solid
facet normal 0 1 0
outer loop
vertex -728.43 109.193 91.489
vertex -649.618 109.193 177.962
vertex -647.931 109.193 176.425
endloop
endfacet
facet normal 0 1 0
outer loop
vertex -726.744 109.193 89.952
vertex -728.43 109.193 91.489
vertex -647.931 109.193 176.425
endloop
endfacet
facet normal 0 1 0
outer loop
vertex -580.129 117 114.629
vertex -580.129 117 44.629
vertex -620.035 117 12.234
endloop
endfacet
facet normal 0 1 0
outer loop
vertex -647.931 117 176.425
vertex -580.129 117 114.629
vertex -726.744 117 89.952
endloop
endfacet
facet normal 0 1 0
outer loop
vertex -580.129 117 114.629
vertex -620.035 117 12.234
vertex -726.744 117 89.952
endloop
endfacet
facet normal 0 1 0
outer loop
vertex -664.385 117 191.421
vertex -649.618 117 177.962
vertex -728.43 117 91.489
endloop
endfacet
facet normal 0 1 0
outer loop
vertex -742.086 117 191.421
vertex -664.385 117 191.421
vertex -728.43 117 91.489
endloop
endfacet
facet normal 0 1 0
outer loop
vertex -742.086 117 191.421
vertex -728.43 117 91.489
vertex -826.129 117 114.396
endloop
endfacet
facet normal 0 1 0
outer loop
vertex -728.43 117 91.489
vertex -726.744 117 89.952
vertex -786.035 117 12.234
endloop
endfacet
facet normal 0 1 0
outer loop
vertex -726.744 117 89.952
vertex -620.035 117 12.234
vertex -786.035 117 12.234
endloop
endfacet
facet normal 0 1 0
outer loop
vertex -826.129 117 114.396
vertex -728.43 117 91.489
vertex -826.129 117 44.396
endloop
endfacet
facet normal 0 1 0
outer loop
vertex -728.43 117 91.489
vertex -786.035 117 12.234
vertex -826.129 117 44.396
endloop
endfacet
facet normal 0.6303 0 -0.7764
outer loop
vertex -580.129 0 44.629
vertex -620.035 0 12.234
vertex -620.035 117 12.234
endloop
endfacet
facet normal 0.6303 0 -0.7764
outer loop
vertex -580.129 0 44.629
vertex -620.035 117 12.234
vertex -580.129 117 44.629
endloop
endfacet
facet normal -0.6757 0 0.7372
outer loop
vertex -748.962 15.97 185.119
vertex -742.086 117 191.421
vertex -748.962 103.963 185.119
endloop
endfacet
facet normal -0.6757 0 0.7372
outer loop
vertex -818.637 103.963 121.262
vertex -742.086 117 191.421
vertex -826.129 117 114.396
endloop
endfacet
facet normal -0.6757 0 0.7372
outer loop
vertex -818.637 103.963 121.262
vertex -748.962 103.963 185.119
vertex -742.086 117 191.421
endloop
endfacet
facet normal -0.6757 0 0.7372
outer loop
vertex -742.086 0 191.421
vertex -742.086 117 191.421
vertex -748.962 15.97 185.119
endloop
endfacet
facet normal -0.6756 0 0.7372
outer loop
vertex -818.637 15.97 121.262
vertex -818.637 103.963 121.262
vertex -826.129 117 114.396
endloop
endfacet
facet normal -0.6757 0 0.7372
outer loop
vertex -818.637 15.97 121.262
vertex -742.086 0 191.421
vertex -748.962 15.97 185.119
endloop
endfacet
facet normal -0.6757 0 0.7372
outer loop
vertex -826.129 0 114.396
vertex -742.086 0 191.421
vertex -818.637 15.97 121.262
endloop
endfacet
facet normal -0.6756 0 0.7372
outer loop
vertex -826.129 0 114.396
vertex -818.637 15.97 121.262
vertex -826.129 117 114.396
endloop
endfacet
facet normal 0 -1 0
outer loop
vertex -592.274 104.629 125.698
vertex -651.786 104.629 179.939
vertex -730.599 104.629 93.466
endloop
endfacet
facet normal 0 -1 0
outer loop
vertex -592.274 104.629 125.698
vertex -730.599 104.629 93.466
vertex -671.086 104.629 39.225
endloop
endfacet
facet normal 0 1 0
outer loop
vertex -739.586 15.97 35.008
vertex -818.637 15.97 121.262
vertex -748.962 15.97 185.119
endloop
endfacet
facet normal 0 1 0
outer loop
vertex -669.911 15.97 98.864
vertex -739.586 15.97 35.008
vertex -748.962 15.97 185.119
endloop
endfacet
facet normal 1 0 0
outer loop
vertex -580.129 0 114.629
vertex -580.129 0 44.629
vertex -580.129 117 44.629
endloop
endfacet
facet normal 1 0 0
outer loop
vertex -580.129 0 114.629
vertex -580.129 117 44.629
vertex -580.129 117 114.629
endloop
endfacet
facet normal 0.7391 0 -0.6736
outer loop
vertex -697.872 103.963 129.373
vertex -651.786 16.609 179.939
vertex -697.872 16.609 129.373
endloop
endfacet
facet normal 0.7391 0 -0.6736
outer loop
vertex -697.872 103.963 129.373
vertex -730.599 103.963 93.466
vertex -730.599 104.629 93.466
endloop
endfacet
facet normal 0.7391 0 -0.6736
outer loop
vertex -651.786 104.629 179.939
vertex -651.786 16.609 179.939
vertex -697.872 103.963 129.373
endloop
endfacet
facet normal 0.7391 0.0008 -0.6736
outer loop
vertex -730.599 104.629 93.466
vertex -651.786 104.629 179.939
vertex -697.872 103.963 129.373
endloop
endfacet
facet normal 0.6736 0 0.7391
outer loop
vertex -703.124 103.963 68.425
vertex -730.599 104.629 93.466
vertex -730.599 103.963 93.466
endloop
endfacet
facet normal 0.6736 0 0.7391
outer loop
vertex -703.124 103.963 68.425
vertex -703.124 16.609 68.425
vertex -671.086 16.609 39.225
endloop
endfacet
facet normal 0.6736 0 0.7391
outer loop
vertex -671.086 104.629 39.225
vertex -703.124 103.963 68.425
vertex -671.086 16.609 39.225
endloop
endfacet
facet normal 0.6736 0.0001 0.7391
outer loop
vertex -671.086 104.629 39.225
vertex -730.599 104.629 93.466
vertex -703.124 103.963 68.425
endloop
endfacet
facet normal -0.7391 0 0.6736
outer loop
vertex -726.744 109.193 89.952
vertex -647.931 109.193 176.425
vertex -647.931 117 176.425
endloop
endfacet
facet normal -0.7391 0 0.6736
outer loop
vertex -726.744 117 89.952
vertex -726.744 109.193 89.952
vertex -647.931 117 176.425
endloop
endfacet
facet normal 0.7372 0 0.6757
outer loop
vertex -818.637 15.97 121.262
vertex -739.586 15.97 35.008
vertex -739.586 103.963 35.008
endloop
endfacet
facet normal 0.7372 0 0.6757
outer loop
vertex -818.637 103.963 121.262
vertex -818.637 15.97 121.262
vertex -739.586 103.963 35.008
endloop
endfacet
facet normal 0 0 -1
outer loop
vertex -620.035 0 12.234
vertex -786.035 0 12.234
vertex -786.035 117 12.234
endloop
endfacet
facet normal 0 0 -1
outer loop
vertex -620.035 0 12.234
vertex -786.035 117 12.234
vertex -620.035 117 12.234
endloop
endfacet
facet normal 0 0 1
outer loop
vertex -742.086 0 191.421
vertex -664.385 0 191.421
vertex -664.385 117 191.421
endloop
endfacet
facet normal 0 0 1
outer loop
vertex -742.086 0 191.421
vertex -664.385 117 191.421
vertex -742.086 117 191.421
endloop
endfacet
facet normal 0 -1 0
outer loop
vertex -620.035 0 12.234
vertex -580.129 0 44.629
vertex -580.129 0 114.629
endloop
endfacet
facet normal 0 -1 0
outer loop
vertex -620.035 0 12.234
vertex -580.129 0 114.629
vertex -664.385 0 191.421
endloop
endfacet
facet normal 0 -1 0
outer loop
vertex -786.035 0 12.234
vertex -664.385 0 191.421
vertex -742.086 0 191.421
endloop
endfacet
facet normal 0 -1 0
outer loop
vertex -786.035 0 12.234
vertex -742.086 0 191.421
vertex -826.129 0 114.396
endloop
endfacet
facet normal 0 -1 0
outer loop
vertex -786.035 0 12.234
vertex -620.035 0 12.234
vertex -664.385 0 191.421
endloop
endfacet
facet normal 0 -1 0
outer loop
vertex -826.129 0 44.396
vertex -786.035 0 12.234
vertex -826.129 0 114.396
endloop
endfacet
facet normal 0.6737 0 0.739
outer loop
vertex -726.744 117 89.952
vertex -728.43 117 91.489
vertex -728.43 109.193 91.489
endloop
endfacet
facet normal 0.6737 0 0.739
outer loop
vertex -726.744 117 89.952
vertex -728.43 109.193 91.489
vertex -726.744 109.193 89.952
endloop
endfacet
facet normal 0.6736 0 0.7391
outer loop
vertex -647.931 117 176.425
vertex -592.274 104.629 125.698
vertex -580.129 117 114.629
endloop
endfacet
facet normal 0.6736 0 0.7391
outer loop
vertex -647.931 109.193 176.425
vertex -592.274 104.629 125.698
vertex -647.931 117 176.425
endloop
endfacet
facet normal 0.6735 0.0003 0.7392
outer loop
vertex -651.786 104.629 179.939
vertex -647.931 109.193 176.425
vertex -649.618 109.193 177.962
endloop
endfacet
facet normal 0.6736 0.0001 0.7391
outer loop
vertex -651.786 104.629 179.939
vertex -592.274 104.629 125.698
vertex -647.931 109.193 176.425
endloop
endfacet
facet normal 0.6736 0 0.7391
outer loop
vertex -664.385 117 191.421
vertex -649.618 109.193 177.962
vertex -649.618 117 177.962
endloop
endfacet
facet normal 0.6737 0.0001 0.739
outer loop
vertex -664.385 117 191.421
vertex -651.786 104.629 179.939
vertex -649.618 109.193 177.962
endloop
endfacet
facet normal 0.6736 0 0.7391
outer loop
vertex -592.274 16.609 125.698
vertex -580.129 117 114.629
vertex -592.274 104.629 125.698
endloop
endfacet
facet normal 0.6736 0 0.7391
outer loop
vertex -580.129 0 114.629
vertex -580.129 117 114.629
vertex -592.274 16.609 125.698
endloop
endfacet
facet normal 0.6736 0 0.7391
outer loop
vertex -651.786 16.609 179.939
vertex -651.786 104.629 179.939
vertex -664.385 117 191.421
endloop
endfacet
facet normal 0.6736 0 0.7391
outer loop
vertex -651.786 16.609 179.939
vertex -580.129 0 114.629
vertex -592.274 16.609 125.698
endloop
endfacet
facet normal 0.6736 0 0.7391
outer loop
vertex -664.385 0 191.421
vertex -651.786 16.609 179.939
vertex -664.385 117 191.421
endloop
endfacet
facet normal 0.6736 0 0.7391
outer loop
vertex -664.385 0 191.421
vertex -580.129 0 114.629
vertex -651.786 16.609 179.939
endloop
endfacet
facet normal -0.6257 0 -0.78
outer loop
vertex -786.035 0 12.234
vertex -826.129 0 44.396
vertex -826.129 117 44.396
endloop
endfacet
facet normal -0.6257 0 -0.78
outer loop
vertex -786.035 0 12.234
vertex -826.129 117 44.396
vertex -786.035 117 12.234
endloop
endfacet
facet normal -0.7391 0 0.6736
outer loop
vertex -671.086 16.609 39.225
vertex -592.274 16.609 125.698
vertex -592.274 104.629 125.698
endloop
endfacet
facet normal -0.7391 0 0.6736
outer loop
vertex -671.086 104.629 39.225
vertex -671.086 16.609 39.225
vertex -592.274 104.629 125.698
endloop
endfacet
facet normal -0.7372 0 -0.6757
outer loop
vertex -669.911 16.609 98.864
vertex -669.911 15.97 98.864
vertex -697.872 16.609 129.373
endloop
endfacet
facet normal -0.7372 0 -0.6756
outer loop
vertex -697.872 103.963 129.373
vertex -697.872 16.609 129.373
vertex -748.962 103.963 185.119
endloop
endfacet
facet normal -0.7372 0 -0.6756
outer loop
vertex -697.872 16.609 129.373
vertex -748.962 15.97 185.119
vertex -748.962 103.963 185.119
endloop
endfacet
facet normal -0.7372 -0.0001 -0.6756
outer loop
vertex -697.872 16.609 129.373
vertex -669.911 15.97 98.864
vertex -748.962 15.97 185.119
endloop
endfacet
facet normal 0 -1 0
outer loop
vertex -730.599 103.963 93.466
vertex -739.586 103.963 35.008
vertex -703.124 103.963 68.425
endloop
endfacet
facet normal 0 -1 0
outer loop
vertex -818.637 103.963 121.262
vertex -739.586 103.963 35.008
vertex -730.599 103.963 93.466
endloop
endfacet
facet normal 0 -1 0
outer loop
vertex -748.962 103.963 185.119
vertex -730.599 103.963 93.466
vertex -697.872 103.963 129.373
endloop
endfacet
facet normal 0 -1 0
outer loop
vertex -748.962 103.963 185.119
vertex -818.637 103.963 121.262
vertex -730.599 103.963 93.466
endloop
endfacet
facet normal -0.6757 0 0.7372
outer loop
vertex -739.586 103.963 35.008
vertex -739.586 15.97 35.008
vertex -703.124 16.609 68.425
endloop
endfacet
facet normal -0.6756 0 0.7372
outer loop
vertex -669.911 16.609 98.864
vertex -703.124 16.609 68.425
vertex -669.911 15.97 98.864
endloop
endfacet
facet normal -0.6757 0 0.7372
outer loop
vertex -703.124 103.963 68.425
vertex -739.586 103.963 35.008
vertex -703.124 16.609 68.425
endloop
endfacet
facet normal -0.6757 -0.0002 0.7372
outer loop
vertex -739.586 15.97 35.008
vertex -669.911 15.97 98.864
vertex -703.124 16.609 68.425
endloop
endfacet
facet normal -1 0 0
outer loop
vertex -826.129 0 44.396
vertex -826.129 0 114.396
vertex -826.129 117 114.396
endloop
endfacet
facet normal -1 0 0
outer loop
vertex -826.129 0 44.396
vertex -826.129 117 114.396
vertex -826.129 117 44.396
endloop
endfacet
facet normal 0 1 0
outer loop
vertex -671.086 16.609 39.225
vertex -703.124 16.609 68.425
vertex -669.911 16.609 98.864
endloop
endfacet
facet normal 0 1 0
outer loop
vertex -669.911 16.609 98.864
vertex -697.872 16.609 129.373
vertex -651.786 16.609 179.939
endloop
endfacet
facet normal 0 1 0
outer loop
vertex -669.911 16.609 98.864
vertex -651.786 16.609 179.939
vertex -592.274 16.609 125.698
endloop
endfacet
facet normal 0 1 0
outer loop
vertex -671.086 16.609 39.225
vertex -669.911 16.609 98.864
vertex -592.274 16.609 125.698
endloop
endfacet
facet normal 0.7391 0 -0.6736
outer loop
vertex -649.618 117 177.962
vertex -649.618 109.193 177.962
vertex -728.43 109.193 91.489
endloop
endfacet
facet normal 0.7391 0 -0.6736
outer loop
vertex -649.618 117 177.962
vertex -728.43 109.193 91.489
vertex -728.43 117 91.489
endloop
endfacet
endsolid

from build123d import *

# Parameters (mm, degrees)
BOSS_EXTRUDE3_DEPTH = 117
SKETCH3_W           = 2.281994321
SKETCH3_H           = 23.79794077
SKETCH3_W_2         = 80.521799592
SKETCH3_H_2         = 88.019780931
CUT_EXTRUDE1_DEPTH  = 117
SKETCH4_W           = 94.510648664
SKETCH4_H           = 87.992672894
CUT_EXTRUDE2_DEPTH  = 117


with BuildPart() as part:
    # Sketch2 → Boss-Extrude3 (new body)
    with BuildSketch(Plane(origin=(0, 0, 0), x_dir=(1, 0, 0), z_dir=(0, 1, 0))):
        Polygon((-826.128986822, -44.396477746), (-786.035151567, -12.233698412), (-620.035151567, -12.233698412), (-580.129096878, -44.629173391), (-580.129096878, -114.629173391), (-664.384727068, -191.421027004), (-742.086028689, -191.421027004), (-826.128986822, -114.396477746), align=None)
    extrude(amount=BOSS_EXTRUDE3_DEPTH)

    # Sketch3 → Cut-Extrude1 (cut)
    with BuildSketch(Plane(origin=(-206.167073408, 0, -226.205461612), x_dir=(0.7390844753537593, 0, -0.6736127509860976), z_dir=(0.6736127509860976, 0, 0.7390844753537593))):
        with Locations((-598.858942552, 121.091844218)):
            Rectangle(SKETCH3_W, SKETCH3_H)
        with Locations((-562.673032613, 60.618994727)):
            Rectangle(SKETCH3_W_2, SKETCH3_H_2)
    extrude(amount=-CUT_EXTRUDE1_DEPTH, mode=Mode.SUBTRACT)

    # Sketch4 → Cut-Extrude2 (cut)
    with BuildSketch(Plane(origin=(-434.116139586, 0, 473.672418674), x_dir=(0.7372189309889005, 0, 0.6756539408540315), z_dir=(-0.6756539408540315, 0, 0.7372189309889005))):
        with Locations((-474.328289605, 59.966544548)):
            Rectangle(SKETCH4_W, SKETCH4_H)
    extrude(amount=-CUT_EXTRUDE2_DEPTH, mode=Mode.SUBTRACT)


solid = part.part
